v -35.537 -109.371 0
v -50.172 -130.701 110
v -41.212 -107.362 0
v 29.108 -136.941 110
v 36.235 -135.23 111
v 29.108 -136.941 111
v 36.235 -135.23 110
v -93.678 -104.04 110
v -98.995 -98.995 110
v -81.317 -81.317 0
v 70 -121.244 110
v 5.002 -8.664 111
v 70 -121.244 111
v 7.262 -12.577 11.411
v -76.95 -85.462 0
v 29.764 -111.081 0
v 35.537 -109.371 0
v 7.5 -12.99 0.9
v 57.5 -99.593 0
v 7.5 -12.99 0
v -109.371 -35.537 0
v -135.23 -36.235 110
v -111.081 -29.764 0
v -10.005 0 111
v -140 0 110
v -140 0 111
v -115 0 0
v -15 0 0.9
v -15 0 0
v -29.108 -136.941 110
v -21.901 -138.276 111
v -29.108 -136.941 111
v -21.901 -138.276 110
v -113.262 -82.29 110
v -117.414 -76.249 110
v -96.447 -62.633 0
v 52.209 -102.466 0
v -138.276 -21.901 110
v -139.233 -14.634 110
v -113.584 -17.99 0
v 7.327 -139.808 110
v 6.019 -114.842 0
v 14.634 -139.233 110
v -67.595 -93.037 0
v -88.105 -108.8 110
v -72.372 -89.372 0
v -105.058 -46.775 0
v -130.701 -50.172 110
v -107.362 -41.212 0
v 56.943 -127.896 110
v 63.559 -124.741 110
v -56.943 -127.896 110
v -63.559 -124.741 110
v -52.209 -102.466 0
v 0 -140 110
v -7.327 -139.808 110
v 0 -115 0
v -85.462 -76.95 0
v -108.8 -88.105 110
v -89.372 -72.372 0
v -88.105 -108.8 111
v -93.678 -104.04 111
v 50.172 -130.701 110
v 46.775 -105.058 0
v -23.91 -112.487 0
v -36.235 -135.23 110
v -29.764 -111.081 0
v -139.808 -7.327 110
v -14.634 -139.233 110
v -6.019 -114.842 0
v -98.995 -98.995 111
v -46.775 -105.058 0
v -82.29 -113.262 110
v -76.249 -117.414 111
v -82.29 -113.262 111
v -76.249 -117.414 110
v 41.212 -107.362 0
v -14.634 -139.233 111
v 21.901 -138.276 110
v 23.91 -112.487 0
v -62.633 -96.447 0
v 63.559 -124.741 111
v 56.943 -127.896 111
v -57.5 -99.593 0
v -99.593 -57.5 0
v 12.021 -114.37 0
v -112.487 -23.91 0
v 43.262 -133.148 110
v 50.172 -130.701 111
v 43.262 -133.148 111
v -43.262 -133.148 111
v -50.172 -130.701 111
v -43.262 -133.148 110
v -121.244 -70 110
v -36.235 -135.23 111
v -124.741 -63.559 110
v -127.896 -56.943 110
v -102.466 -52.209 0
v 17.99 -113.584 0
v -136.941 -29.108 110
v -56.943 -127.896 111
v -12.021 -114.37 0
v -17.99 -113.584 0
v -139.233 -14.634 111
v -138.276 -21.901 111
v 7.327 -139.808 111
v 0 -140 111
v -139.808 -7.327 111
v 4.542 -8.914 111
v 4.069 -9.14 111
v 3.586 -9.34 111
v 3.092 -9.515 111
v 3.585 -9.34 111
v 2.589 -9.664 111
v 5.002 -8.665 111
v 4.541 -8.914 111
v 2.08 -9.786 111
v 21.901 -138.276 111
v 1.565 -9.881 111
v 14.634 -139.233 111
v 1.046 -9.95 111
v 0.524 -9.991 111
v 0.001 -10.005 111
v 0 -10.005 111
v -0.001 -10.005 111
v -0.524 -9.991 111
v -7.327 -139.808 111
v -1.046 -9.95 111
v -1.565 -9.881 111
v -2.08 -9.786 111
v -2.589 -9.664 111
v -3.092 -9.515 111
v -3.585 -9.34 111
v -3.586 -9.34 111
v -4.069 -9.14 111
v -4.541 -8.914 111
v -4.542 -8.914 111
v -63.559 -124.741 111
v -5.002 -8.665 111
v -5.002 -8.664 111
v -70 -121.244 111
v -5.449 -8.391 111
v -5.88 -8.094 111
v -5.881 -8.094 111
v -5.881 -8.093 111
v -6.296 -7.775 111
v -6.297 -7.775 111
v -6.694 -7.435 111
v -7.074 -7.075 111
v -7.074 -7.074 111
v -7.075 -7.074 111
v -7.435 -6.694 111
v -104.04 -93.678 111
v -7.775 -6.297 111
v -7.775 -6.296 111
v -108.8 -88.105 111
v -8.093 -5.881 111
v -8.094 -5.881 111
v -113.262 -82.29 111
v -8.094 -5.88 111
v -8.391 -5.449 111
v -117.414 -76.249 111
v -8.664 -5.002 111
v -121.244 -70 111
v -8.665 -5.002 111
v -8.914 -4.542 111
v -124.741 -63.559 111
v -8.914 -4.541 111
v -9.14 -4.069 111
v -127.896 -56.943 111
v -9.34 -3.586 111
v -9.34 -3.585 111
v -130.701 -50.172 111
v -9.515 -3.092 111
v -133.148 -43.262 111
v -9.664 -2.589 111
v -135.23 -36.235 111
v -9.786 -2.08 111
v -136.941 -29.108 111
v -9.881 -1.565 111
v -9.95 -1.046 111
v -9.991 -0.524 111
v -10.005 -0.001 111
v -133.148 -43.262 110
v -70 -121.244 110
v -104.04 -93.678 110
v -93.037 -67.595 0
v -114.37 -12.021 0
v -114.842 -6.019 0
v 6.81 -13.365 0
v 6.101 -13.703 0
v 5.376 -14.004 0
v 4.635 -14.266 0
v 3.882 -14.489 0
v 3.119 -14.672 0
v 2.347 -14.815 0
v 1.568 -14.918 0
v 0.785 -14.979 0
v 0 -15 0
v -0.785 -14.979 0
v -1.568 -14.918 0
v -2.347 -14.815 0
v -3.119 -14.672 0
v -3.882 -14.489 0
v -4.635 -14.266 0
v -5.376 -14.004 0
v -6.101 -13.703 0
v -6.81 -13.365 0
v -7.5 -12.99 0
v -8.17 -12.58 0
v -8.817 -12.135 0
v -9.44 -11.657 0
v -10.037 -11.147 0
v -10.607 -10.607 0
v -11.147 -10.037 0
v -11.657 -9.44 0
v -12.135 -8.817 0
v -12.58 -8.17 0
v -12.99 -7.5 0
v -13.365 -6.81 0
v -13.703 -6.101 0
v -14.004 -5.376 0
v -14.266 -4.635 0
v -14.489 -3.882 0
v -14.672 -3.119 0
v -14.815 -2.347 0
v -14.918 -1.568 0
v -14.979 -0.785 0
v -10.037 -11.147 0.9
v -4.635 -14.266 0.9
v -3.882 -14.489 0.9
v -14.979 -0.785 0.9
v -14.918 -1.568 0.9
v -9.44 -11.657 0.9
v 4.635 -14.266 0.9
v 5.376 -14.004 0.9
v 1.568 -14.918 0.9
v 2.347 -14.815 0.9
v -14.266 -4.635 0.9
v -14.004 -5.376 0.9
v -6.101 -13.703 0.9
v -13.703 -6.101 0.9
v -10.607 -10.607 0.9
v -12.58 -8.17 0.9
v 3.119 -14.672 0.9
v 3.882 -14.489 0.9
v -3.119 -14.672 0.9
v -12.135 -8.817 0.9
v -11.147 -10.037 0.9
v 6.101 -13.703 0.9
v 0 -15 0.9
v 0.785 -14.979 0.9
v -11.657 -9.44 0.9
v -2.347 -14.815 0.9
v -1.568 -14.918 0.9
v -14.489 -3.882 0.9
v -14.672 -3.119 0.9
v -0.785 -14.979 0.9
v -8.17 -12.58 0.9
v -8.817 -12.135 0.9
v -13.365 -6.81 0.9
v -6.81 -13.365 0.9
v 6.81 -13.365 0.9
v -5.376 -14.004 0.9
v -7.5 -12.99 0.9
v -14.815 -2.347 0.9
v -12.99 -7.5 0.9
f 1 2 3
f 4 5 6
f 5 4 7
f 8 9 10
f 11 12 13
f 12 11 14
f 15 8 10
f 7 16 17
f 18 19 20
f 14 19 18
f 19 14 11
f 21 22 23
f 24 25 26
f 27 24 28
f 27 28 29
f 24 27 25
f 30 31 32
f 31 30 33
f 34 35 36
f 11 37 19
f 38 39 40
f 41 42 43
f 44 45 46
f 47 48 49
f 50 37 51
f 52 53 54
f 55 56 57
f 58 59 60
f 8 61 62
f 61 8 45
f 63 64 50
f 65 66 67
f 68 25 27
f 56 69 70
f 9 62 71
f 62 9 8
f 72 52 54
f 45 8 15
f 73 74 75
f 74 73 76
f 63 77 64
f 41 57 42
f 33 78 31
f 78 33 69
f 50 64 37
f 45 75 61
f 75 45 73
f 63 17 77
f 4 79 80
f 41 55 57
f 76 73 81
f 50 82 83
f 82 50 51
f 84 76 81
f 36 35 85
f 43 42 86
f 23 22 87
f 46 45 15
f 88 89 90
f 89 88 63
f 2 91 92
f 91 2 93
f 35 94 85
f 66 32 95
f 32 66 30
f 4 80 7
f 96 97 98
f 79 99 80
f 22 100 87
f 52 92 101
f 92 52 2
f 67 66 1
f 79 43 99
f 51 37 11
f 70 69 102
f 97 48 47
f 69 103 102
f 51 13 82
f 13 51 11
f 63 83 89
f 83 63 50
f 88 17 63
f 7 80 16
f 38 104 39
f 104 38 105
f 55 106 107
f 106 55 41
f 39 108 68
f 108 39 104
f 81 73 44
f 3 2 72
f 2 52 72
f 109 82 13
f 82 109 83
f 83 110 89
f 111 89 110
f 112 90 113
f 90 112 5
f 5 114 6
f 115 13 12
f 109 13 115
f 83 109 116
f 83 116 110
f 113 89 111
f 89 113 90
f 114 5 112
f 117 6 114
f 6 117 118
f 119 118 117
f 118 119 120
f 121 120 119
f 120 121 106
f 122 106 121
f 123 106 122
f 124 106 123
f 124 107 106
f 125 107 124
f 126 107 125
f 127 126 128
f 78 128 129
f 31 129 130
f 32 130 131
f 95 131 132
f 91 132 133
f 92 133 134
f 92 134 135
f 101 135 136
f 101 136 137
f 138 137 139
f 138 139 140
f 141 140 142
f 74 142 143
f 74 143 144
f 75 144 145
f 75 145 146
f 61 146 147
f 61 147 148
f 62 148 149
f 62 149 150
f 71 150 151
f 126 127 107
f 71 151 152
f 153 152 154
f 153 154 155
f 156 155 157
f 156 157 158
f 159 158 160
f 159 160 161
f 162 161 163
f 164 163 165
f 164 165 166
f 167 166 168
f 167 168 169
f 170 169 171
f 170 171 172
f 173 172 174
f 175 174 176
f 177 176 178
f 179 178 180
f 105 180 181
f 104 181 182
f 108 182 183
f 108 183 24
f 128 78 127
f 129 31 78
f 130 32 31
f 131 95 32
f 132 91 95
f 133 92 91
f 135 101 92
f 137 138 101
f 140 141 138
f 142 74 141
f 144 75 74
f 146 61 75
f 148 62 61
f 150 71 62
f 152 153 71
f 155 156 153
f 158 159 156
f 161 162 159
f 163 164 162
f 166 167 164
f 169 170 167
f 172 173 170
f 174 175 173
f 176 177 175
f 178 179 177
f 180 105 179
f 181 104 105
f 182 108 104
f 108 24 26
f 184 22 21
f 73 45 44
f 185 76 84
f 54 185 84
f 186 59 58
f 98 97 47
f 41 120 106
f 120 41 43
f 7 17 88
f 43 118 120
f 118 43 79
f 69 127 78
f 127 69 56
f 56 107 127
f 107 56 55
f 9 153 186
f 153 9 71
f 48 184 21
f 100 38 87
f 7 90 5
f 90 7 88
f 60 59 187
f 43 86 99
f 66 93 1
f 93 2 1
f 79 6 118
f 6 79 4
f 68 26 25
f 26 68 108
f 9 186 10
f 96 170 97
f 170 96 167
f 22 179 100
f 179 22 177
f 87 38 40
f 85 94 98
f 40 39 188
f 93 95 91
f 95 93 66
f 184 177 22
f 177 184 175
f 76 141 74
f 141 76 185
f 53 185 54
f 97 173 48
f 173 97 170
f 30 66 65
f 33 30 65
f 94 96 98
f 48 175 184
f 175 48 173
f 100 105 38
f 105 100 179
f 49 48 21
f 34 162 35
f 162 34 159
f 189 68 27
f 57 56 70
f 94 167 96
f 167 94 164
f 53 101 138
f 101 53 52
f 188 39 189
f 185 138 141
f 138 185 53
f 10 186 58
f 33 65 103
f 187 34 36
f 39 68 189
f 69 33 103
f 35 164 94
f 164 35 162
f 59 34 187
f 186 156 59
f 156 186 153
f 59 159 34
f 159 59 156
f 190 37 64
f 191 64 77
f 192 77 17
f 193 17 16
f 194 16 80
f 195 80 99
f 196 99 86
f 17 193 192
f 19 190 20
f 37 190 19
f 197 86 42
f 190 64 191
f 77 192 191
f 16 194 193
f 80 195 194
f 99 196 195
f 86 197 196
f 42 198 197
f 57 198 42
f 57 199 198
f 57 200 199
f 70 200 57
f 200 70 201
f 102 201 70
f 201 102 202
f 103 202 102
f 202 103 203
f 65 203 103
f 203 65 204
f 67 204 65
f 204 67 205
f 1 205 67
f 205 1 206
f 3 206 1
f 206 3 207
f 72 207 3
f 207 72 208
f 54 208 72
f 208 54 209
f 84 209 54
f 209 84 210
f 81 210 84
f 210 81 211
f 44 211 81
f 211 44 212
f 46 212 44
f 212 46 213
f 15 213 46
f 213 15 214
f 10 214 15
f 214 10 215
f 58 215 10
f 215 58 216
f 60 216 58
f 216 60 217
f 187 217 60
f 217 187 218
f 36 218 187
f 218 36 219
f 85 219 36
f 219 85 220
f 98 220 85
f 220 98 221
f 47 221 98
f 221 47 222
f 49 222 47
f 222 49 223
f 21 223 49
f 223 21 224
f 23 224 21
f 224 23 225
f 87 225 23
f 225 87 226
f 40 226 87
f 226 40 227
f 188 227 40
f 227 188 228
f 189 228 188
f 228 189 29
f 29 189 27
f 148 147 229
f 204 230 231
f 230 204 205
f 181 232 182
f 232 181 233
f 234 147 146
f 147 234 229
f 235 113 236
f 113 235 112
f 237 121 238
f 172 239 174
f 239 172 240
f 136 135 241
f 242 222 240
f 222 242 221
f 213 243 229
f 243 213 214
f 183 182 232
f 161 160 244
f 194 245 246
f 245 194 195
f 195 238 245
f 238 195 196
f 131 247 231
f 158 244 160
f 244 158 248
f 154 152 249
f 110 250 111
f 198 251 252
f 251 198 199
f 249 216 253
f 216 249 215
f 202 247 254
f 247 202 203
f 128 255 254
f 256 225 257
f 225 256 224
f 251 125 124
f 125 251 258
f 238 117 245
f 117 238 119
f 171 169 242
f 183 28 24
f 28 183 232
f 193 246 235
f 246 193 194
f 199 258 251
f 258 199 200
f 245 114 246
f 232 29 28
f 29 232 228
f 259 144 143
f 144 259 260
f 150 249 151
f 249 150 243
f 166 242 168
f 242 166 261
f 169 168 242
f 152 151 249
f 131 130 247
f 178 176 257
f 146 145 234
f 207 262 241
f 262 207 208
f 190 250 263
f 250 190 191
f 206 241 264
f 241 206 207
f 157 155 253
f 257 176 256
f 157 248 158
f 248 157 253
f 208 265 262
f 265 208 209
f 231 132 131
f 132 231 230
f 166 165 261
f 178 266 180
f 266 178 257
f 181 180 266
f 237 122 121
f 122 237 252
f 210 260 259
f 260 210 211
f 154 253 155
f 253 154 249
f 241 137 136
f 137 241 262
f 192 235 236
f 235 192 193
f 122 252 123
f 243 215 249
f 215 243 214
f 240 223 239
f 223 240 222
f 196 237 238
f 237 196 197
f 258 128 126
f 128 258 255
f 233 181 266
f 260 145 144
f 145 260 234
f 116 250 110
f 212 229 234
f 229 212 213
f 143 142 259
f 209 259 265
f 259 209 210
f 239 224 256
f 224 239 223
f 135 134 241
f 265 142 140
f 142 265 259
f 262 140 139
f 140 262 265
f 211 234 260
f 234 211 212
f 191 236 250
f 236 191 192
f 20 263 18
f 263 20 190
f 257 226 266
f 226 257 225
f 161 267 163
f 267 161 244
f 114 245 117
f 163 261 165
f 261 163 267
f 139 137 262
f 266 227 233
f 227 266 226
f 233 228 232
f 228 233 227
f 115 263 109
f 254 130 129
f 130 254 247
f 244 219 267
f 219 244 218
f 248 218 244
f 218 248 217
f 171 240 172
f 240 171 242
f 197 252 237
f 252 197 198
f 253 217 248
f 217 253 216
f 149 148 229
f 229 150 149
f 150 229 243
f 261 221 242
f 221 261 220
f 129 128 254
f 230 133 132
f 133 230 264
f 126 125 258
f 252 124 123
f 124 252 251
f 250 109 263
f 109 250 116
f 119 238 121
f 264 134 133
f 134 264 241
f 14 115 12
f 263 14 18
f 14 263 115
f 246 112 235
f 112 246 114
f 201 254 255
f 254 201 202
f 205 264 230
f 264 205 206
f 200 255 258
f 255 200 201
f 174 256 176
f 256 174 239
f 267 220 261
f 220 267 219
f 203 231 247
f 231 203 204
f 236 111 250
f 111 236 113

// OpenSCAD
// # Measurements of IKEA planter
// Height: 11cm
// Upper outer diameter: 14cm
// Upper inner diameter: 1cm
// Lower outer diameter: 11.5cm
// Lower inner diameter: 1.5cm

h = 110;
r_upper_outer = 140;
r_upper_inner = 10;
r_lower_outer = 115;
r_lower_inner = 15;
deg = 120;
sep_width = 5;

$fa = 3;
$fs = 0.1;


difference() {
    sink_tapered(h, r_upper_outer, r_upper_inner, r_lower_outer, r_lower_inner, deg, 0);
    //translate([0, 0, 1]) 
    //    sink_tapered(h, r_upper_outer-sep_width/2, r_upper_inner+sep_width/2, r_lower_outer-2, r_lower_inner+2, deg-sep_width, sep_width);
}

module sink_tapered(h, r_uo, r_ui, r_lo, r_li, deg_start, deg_end = 0)
    difference() {
        // Main part
        hull() {
            translate([0, 0, h]) sector(1, 2*r_uo, deg_start, deg_end);
            sector(1, 2*r_lo, deg_start, deg_end);
        }
        // Inner hole
        hull() {
            translate([0,0,h+0.1]) cylinder(h=1, d=2*r_ui);
            translate([0,0,-0.1]) cylinder(h=1, d=2*r_li);
        }
    }

module sink(h, r, r_inner, deg_start, deg_end = 0) {
    difference() {
        translate([0,0,0]) sector(h, 2*r, deg_start, deg_end);
        translate([0,0,-1]) cylinder(h=2*h, d=2*r_inner);
    }
}
//translate([22,0,0]) sector(30, 20, 300, 30);
//translate([0,22,0]) sector(30, 20, 30, 300);
//translate([22,22,0]) sector(30, 20, 10, 190);

module sector(h, d, a1, a2) {
    if (a2 - a1 > 180) {
        difference() {
            cylinder(h=h, d=d);
            translate([0,0,-0.5]) sector(h+1, d+1, a2-360, a1); 
        }
    } else {
        difference() {
            cylinder(h=h, d=d);
            rotate([0,0,a1]) translate([-d/2, -d/2, -0.5])
                cube([d, d/2, h+1]);
            rotate([0,0,a2]) translate([-d/2, 0, -0.5])
                cube([d, d/2, h+1]);
        }
    }
}  
